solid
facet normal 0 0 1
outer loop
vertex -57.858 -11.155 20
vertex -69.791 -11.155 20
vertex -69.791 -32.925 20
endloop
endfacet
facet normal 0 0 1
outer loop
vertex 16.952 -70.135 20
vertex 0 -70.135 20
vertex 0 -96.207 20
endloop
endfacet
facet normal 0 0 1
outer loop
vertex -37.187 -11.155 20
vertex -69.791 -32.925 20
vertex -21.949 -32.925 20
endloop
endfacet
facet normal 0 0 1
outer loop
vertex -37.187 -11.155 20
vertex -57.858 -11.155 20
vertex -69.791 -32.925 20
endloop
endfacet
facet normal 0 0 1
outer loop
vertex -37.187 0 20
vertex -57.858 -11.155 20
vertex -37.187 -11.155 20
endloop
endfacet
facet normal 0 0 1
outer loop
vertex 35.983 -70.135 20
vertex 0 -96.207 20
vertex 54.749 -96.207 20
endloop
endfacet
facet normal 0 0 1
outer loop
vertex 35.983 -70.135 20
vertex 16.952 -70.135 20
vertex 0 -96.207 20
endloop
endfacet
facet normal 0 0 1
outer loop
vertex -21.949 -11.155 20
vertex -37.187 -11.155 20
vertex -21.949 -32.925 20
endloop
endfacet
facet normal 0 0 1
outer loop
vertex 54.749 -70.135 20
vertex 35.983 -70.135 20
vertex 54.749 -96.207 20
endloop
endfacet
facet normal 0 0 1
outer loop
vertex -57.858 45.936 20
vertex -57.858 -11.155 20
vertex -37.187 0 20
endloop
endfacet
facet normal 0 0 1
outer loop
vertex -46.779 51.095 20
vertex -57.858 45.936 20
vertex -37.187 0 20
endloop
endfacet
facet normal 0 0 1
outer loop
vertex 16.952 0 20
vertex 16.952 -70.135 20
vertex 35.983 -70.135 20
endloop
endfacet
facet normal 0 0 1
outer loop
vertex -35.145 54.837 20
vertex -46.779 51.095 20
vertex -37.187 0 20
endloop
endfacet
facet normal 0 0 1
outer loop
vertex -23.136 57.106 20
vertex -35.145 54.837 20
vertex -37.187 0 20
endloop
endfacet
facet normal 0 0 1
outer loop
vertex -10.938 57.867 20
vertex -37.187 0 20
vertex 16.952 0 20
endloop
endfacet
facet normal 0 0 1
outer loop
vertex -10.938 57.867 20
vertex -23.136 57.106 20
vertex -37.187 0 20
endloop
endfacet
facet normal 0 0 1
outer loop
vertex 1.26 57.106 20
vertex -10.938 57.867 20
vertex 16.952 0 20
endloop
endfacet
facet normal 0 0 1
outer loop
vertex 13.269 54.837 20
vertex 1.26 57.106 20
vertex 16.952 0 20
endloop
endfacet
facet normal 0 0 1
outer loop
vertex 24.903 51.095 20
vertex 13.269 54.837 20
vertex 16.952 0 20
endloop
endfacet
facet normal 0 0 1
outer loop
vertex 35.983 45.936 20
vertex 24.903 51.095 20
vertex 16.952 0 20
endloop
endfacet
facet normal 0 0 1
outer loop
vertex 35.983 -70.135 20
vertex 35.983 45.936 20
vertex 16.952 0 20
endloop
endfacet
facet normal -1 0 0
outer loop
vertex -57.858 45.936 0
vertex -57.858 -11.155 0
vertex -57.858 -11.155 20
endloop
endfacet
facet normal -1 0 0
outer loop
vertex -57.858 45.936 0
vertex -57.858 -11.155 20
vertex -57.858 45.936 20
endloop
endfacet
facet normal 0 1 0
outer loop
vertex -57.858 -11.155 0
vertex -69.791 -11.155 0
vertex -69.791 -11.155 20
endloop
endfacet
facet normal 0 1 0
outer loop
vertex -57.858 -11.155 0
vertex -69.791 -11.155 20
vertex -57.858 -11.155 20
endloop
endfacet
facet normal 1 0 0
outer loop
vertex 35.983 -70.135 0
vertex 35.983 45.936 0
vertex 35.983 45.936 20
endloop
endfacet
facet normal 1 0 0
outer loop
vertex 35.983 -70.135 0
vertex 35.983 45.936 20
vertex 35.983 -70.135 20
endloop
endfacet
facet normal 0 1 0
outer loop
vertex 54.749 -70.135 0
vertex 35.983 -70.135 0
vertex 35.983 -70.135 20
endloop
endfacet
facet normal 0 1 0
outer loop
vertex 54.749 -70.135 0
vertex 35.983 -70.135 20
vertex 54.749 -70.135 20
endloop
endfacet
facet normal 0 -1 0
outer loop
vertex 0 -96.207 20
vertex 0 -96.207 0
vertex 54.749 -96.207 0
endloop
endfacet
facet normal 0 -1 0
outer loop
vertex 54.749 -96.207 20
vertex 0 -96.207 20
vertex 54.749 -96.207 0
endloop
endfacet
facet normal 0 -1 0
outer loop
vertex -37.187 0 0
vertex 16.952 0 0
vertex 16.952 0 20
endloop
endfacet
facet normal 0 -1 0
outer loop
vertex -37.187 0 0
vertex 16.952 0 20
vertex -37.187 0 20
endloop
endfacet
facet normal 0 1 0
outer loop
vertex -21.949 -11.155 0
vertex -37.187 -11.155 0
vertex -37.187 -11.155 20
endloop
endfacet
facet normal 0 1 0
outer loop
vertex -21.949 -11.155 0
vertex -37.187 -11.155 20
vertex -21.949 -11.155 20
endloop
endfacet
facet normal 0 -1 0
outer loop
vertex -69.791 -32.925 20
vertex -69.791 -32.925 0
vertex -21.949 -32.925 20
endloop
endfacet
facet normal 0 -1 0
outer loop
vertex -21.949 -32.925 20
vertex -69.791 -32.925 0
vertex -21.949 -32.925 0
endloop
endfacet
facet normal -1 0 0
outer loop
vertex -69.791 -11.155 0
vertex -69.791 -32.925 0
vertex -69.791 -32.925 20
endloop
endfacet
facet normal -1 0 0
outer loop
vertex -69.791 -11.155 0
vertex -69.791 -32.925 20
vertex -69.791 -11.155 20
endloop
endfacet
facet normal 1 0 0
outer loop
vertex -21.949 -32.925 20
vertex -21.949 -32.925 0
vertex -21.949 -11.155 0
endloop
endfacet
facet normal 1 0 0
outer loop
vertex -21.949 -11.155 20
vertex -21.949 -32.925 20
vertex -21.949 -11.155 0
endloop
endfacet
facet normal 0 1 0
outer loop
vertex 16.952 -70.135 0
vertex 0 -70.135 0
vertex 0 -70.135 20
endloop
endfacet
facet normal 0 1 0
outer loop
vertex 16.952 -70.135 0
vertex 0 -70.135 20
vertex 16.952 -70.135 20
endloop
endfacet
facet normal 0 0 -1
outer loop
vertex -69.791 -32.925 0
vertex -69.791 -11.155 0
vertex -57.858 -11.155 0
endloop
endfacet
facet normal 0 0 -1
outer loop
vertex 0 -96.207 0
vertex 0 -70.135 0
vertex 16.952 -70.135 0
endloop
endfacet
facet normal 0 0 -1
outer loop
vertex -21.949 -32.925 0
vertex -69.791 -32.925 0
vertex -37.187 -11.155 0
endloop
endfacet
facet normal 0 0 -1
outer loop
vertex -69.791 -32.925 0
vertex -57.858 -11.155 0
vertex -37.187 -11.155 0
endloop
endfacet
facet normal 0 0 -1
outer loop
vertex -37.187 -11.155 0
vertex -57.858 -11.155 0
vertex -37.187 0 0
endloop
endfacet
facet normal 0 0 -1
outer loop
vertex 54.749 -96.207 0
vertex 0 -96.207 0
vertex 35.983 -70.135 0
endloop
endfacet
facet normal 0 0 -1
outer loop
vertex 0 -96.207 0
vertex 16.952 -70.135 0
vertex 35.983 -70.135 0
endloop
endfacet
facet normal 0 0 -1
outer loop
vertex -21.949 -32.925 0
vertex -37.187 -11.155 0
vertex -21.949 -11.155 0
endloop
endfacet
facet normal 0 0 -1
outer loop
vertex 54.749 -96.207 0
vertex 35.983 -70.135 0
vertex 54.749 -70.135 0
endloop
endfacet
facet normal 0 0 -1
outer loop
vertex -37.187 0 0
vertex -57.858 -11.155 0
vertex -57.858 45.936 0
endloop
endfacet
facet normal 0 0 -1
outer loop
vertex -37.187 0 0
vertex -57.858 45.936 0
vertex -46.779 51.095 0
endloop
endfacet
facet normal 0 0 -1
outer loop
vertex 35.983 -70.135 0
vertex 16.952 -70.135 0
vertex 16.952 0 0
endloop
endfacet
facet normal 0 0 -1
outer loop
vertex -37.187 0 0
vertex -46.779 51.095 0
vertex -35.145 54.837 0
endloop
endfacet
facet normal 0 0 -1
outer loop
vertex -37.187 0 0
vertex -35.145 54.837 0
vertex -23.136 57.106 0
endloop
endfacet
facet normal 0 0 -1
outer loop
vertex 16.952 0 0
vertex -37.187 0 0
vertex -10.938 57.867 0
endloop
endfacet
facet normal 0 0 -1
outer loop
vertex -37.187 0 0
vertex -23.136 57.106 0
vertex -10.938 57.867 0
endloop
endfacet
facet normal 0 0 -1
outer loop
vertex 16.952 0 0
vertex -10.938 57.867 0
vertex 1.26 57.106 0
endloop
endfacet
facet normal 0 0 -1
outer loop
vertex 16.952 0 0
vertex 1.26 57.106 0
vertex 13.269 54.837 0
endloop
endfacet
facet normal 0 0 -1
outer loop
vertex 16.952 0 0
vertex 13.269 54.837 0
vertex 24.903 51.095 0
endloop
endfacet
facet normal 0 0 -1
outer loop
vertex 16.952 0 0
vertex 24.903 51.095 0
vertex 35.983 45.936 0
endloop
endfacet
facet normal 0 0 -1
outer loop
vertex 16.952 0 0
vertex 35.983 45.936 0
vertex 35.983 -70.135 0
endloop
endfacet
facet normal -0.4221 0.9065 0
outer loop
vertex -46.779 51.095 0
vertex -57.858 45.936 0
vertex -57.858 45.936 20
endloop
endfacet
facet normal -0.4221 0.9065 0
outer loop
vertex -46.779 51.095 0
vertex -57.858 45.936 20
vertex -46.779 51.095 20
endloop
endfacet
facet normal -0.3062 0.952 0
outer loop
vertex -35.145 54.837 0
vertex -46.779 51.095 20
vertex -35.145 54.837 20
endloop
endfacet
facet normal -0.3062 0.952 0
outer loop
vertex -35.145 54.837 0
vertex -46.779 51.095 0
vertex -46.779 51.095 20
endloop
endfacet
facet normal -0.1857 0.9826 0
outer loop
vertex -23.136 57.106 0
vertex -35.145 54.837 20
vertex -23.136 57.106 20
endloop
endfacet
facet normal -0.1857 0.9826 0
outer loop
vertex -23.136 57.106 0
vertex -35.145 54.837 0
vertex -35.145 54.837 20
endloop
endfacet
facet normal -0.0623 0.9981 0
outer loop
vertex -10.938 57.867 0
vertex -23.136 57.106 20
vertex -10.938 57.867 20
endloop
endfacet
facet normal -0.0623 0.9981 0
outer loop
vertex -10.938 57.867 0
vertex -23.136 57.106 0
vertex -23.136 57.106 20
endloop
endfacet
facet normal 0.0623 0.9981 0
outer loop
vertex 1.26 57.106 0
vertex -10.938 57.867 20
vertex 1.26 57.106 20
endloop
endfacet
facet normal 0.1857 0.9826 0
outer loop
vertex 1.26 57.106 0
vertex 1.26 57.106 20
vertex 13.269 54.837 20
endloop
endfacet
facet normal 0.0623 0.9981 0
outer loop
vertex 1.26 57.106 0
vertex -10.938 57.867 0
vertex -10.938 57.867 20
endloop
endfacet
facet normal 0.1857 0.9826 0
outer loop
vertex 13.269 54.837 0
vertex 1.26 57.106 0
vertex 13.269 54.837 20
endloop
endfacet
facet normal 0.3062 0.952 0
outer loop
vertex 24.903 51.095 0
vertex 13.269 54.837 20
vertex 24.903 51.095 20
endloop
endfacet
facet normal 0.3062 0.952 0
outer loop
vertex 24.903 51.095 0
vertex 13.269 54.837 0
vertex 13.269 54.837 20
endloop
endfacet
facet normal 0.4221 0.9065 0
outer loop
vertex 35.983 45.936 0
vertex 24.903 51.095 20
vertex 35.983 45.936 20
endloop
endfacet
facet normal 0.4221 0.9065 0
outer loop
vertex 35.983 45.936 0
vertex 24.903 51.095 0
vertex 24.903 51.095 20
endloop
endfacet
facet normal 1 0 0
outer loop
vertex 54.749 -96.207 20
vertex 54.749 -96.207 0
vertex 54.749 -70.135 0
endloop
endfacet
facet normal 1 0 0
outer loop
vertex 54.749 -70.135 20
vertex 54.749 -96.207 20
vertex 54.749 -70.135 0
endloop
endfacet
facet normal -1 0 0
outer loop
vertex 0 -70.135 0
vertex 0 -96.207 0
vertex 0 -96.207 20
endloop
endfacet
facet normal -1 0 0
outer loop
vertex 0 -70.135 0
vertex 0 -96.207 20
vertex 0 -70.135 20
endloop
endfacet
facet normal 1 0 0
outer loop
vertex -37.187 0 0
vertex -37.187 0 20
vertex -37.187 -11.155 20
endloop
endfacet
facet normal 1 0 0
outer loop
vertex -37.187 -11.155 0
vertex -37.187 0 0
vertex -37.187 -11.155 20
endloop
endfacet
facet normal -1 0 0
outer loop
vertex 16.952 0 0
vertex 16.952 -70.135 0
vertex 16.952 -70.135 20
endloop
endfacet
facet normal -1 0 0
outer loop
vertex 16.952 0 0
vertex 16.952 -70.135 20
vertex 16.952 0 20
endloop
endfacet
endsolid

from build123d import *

# Parameters (mm, degrees)
BOSS_EXTRUDE1_DEPTH = 20
SKETCH3_W           = 47.8415773
SKETCH3_H           = 21.769183321
SKETCH3_W_2         = 54.74945498
SKETCH3_H_2         = 26.072393978
BOSS_EXTRUDE2_DEPTH = 20


with BuildPart() as part:
    # Sketch1 → Boss-Extrude1 (new body)
    with BuildSketch(Plane.XY):
        with BuildLine():
            ThreePointArc((-57.85830676, 45.936170213), (-10.937790042, 57.86666983), (35.982726675, 45.936170213))
            Line((35.982726675, 45.936170213), (35.982726675, -85.966261398))
            Line((35.982726675, -85.966261398), (16.952027587, -85.966261398))
            Line((16.952027587, -85.966261398), (16.952027587, 0))
            Line((16.952027587, 0), (-37.187030164, 0))
            Line((-37.187030164, 0), (-37.187030164, -22.639969605))
            Line((-37.187030164, -22.639969605), (-57.85830676, -22.639969605))
            Line((-57.85830676, -22.639969605), (-57.85830676, 0))
            Line((-57.85830676, 0), (-57.85830676, 45.936170213))
        make_face()
    extrude(amount=BOSS_EXTRUDE1_DEPTH)

    # Sketch3 → Boss-Extrude2 (add)
    with BuildSketch(Plane.XY):
        with Locations((-45.869735372, -22.040085901)):
            Rectangle(SKETCH3_W, SKETCH3_H)
        with Locations((27.37472749, -83.170990229)):
            Rectangle(SKETCH3_W_2, SKETCH3_H_2)
    extrude(amount=BOSS_EXTRUDE2_DEPTH)


solid = part.part
